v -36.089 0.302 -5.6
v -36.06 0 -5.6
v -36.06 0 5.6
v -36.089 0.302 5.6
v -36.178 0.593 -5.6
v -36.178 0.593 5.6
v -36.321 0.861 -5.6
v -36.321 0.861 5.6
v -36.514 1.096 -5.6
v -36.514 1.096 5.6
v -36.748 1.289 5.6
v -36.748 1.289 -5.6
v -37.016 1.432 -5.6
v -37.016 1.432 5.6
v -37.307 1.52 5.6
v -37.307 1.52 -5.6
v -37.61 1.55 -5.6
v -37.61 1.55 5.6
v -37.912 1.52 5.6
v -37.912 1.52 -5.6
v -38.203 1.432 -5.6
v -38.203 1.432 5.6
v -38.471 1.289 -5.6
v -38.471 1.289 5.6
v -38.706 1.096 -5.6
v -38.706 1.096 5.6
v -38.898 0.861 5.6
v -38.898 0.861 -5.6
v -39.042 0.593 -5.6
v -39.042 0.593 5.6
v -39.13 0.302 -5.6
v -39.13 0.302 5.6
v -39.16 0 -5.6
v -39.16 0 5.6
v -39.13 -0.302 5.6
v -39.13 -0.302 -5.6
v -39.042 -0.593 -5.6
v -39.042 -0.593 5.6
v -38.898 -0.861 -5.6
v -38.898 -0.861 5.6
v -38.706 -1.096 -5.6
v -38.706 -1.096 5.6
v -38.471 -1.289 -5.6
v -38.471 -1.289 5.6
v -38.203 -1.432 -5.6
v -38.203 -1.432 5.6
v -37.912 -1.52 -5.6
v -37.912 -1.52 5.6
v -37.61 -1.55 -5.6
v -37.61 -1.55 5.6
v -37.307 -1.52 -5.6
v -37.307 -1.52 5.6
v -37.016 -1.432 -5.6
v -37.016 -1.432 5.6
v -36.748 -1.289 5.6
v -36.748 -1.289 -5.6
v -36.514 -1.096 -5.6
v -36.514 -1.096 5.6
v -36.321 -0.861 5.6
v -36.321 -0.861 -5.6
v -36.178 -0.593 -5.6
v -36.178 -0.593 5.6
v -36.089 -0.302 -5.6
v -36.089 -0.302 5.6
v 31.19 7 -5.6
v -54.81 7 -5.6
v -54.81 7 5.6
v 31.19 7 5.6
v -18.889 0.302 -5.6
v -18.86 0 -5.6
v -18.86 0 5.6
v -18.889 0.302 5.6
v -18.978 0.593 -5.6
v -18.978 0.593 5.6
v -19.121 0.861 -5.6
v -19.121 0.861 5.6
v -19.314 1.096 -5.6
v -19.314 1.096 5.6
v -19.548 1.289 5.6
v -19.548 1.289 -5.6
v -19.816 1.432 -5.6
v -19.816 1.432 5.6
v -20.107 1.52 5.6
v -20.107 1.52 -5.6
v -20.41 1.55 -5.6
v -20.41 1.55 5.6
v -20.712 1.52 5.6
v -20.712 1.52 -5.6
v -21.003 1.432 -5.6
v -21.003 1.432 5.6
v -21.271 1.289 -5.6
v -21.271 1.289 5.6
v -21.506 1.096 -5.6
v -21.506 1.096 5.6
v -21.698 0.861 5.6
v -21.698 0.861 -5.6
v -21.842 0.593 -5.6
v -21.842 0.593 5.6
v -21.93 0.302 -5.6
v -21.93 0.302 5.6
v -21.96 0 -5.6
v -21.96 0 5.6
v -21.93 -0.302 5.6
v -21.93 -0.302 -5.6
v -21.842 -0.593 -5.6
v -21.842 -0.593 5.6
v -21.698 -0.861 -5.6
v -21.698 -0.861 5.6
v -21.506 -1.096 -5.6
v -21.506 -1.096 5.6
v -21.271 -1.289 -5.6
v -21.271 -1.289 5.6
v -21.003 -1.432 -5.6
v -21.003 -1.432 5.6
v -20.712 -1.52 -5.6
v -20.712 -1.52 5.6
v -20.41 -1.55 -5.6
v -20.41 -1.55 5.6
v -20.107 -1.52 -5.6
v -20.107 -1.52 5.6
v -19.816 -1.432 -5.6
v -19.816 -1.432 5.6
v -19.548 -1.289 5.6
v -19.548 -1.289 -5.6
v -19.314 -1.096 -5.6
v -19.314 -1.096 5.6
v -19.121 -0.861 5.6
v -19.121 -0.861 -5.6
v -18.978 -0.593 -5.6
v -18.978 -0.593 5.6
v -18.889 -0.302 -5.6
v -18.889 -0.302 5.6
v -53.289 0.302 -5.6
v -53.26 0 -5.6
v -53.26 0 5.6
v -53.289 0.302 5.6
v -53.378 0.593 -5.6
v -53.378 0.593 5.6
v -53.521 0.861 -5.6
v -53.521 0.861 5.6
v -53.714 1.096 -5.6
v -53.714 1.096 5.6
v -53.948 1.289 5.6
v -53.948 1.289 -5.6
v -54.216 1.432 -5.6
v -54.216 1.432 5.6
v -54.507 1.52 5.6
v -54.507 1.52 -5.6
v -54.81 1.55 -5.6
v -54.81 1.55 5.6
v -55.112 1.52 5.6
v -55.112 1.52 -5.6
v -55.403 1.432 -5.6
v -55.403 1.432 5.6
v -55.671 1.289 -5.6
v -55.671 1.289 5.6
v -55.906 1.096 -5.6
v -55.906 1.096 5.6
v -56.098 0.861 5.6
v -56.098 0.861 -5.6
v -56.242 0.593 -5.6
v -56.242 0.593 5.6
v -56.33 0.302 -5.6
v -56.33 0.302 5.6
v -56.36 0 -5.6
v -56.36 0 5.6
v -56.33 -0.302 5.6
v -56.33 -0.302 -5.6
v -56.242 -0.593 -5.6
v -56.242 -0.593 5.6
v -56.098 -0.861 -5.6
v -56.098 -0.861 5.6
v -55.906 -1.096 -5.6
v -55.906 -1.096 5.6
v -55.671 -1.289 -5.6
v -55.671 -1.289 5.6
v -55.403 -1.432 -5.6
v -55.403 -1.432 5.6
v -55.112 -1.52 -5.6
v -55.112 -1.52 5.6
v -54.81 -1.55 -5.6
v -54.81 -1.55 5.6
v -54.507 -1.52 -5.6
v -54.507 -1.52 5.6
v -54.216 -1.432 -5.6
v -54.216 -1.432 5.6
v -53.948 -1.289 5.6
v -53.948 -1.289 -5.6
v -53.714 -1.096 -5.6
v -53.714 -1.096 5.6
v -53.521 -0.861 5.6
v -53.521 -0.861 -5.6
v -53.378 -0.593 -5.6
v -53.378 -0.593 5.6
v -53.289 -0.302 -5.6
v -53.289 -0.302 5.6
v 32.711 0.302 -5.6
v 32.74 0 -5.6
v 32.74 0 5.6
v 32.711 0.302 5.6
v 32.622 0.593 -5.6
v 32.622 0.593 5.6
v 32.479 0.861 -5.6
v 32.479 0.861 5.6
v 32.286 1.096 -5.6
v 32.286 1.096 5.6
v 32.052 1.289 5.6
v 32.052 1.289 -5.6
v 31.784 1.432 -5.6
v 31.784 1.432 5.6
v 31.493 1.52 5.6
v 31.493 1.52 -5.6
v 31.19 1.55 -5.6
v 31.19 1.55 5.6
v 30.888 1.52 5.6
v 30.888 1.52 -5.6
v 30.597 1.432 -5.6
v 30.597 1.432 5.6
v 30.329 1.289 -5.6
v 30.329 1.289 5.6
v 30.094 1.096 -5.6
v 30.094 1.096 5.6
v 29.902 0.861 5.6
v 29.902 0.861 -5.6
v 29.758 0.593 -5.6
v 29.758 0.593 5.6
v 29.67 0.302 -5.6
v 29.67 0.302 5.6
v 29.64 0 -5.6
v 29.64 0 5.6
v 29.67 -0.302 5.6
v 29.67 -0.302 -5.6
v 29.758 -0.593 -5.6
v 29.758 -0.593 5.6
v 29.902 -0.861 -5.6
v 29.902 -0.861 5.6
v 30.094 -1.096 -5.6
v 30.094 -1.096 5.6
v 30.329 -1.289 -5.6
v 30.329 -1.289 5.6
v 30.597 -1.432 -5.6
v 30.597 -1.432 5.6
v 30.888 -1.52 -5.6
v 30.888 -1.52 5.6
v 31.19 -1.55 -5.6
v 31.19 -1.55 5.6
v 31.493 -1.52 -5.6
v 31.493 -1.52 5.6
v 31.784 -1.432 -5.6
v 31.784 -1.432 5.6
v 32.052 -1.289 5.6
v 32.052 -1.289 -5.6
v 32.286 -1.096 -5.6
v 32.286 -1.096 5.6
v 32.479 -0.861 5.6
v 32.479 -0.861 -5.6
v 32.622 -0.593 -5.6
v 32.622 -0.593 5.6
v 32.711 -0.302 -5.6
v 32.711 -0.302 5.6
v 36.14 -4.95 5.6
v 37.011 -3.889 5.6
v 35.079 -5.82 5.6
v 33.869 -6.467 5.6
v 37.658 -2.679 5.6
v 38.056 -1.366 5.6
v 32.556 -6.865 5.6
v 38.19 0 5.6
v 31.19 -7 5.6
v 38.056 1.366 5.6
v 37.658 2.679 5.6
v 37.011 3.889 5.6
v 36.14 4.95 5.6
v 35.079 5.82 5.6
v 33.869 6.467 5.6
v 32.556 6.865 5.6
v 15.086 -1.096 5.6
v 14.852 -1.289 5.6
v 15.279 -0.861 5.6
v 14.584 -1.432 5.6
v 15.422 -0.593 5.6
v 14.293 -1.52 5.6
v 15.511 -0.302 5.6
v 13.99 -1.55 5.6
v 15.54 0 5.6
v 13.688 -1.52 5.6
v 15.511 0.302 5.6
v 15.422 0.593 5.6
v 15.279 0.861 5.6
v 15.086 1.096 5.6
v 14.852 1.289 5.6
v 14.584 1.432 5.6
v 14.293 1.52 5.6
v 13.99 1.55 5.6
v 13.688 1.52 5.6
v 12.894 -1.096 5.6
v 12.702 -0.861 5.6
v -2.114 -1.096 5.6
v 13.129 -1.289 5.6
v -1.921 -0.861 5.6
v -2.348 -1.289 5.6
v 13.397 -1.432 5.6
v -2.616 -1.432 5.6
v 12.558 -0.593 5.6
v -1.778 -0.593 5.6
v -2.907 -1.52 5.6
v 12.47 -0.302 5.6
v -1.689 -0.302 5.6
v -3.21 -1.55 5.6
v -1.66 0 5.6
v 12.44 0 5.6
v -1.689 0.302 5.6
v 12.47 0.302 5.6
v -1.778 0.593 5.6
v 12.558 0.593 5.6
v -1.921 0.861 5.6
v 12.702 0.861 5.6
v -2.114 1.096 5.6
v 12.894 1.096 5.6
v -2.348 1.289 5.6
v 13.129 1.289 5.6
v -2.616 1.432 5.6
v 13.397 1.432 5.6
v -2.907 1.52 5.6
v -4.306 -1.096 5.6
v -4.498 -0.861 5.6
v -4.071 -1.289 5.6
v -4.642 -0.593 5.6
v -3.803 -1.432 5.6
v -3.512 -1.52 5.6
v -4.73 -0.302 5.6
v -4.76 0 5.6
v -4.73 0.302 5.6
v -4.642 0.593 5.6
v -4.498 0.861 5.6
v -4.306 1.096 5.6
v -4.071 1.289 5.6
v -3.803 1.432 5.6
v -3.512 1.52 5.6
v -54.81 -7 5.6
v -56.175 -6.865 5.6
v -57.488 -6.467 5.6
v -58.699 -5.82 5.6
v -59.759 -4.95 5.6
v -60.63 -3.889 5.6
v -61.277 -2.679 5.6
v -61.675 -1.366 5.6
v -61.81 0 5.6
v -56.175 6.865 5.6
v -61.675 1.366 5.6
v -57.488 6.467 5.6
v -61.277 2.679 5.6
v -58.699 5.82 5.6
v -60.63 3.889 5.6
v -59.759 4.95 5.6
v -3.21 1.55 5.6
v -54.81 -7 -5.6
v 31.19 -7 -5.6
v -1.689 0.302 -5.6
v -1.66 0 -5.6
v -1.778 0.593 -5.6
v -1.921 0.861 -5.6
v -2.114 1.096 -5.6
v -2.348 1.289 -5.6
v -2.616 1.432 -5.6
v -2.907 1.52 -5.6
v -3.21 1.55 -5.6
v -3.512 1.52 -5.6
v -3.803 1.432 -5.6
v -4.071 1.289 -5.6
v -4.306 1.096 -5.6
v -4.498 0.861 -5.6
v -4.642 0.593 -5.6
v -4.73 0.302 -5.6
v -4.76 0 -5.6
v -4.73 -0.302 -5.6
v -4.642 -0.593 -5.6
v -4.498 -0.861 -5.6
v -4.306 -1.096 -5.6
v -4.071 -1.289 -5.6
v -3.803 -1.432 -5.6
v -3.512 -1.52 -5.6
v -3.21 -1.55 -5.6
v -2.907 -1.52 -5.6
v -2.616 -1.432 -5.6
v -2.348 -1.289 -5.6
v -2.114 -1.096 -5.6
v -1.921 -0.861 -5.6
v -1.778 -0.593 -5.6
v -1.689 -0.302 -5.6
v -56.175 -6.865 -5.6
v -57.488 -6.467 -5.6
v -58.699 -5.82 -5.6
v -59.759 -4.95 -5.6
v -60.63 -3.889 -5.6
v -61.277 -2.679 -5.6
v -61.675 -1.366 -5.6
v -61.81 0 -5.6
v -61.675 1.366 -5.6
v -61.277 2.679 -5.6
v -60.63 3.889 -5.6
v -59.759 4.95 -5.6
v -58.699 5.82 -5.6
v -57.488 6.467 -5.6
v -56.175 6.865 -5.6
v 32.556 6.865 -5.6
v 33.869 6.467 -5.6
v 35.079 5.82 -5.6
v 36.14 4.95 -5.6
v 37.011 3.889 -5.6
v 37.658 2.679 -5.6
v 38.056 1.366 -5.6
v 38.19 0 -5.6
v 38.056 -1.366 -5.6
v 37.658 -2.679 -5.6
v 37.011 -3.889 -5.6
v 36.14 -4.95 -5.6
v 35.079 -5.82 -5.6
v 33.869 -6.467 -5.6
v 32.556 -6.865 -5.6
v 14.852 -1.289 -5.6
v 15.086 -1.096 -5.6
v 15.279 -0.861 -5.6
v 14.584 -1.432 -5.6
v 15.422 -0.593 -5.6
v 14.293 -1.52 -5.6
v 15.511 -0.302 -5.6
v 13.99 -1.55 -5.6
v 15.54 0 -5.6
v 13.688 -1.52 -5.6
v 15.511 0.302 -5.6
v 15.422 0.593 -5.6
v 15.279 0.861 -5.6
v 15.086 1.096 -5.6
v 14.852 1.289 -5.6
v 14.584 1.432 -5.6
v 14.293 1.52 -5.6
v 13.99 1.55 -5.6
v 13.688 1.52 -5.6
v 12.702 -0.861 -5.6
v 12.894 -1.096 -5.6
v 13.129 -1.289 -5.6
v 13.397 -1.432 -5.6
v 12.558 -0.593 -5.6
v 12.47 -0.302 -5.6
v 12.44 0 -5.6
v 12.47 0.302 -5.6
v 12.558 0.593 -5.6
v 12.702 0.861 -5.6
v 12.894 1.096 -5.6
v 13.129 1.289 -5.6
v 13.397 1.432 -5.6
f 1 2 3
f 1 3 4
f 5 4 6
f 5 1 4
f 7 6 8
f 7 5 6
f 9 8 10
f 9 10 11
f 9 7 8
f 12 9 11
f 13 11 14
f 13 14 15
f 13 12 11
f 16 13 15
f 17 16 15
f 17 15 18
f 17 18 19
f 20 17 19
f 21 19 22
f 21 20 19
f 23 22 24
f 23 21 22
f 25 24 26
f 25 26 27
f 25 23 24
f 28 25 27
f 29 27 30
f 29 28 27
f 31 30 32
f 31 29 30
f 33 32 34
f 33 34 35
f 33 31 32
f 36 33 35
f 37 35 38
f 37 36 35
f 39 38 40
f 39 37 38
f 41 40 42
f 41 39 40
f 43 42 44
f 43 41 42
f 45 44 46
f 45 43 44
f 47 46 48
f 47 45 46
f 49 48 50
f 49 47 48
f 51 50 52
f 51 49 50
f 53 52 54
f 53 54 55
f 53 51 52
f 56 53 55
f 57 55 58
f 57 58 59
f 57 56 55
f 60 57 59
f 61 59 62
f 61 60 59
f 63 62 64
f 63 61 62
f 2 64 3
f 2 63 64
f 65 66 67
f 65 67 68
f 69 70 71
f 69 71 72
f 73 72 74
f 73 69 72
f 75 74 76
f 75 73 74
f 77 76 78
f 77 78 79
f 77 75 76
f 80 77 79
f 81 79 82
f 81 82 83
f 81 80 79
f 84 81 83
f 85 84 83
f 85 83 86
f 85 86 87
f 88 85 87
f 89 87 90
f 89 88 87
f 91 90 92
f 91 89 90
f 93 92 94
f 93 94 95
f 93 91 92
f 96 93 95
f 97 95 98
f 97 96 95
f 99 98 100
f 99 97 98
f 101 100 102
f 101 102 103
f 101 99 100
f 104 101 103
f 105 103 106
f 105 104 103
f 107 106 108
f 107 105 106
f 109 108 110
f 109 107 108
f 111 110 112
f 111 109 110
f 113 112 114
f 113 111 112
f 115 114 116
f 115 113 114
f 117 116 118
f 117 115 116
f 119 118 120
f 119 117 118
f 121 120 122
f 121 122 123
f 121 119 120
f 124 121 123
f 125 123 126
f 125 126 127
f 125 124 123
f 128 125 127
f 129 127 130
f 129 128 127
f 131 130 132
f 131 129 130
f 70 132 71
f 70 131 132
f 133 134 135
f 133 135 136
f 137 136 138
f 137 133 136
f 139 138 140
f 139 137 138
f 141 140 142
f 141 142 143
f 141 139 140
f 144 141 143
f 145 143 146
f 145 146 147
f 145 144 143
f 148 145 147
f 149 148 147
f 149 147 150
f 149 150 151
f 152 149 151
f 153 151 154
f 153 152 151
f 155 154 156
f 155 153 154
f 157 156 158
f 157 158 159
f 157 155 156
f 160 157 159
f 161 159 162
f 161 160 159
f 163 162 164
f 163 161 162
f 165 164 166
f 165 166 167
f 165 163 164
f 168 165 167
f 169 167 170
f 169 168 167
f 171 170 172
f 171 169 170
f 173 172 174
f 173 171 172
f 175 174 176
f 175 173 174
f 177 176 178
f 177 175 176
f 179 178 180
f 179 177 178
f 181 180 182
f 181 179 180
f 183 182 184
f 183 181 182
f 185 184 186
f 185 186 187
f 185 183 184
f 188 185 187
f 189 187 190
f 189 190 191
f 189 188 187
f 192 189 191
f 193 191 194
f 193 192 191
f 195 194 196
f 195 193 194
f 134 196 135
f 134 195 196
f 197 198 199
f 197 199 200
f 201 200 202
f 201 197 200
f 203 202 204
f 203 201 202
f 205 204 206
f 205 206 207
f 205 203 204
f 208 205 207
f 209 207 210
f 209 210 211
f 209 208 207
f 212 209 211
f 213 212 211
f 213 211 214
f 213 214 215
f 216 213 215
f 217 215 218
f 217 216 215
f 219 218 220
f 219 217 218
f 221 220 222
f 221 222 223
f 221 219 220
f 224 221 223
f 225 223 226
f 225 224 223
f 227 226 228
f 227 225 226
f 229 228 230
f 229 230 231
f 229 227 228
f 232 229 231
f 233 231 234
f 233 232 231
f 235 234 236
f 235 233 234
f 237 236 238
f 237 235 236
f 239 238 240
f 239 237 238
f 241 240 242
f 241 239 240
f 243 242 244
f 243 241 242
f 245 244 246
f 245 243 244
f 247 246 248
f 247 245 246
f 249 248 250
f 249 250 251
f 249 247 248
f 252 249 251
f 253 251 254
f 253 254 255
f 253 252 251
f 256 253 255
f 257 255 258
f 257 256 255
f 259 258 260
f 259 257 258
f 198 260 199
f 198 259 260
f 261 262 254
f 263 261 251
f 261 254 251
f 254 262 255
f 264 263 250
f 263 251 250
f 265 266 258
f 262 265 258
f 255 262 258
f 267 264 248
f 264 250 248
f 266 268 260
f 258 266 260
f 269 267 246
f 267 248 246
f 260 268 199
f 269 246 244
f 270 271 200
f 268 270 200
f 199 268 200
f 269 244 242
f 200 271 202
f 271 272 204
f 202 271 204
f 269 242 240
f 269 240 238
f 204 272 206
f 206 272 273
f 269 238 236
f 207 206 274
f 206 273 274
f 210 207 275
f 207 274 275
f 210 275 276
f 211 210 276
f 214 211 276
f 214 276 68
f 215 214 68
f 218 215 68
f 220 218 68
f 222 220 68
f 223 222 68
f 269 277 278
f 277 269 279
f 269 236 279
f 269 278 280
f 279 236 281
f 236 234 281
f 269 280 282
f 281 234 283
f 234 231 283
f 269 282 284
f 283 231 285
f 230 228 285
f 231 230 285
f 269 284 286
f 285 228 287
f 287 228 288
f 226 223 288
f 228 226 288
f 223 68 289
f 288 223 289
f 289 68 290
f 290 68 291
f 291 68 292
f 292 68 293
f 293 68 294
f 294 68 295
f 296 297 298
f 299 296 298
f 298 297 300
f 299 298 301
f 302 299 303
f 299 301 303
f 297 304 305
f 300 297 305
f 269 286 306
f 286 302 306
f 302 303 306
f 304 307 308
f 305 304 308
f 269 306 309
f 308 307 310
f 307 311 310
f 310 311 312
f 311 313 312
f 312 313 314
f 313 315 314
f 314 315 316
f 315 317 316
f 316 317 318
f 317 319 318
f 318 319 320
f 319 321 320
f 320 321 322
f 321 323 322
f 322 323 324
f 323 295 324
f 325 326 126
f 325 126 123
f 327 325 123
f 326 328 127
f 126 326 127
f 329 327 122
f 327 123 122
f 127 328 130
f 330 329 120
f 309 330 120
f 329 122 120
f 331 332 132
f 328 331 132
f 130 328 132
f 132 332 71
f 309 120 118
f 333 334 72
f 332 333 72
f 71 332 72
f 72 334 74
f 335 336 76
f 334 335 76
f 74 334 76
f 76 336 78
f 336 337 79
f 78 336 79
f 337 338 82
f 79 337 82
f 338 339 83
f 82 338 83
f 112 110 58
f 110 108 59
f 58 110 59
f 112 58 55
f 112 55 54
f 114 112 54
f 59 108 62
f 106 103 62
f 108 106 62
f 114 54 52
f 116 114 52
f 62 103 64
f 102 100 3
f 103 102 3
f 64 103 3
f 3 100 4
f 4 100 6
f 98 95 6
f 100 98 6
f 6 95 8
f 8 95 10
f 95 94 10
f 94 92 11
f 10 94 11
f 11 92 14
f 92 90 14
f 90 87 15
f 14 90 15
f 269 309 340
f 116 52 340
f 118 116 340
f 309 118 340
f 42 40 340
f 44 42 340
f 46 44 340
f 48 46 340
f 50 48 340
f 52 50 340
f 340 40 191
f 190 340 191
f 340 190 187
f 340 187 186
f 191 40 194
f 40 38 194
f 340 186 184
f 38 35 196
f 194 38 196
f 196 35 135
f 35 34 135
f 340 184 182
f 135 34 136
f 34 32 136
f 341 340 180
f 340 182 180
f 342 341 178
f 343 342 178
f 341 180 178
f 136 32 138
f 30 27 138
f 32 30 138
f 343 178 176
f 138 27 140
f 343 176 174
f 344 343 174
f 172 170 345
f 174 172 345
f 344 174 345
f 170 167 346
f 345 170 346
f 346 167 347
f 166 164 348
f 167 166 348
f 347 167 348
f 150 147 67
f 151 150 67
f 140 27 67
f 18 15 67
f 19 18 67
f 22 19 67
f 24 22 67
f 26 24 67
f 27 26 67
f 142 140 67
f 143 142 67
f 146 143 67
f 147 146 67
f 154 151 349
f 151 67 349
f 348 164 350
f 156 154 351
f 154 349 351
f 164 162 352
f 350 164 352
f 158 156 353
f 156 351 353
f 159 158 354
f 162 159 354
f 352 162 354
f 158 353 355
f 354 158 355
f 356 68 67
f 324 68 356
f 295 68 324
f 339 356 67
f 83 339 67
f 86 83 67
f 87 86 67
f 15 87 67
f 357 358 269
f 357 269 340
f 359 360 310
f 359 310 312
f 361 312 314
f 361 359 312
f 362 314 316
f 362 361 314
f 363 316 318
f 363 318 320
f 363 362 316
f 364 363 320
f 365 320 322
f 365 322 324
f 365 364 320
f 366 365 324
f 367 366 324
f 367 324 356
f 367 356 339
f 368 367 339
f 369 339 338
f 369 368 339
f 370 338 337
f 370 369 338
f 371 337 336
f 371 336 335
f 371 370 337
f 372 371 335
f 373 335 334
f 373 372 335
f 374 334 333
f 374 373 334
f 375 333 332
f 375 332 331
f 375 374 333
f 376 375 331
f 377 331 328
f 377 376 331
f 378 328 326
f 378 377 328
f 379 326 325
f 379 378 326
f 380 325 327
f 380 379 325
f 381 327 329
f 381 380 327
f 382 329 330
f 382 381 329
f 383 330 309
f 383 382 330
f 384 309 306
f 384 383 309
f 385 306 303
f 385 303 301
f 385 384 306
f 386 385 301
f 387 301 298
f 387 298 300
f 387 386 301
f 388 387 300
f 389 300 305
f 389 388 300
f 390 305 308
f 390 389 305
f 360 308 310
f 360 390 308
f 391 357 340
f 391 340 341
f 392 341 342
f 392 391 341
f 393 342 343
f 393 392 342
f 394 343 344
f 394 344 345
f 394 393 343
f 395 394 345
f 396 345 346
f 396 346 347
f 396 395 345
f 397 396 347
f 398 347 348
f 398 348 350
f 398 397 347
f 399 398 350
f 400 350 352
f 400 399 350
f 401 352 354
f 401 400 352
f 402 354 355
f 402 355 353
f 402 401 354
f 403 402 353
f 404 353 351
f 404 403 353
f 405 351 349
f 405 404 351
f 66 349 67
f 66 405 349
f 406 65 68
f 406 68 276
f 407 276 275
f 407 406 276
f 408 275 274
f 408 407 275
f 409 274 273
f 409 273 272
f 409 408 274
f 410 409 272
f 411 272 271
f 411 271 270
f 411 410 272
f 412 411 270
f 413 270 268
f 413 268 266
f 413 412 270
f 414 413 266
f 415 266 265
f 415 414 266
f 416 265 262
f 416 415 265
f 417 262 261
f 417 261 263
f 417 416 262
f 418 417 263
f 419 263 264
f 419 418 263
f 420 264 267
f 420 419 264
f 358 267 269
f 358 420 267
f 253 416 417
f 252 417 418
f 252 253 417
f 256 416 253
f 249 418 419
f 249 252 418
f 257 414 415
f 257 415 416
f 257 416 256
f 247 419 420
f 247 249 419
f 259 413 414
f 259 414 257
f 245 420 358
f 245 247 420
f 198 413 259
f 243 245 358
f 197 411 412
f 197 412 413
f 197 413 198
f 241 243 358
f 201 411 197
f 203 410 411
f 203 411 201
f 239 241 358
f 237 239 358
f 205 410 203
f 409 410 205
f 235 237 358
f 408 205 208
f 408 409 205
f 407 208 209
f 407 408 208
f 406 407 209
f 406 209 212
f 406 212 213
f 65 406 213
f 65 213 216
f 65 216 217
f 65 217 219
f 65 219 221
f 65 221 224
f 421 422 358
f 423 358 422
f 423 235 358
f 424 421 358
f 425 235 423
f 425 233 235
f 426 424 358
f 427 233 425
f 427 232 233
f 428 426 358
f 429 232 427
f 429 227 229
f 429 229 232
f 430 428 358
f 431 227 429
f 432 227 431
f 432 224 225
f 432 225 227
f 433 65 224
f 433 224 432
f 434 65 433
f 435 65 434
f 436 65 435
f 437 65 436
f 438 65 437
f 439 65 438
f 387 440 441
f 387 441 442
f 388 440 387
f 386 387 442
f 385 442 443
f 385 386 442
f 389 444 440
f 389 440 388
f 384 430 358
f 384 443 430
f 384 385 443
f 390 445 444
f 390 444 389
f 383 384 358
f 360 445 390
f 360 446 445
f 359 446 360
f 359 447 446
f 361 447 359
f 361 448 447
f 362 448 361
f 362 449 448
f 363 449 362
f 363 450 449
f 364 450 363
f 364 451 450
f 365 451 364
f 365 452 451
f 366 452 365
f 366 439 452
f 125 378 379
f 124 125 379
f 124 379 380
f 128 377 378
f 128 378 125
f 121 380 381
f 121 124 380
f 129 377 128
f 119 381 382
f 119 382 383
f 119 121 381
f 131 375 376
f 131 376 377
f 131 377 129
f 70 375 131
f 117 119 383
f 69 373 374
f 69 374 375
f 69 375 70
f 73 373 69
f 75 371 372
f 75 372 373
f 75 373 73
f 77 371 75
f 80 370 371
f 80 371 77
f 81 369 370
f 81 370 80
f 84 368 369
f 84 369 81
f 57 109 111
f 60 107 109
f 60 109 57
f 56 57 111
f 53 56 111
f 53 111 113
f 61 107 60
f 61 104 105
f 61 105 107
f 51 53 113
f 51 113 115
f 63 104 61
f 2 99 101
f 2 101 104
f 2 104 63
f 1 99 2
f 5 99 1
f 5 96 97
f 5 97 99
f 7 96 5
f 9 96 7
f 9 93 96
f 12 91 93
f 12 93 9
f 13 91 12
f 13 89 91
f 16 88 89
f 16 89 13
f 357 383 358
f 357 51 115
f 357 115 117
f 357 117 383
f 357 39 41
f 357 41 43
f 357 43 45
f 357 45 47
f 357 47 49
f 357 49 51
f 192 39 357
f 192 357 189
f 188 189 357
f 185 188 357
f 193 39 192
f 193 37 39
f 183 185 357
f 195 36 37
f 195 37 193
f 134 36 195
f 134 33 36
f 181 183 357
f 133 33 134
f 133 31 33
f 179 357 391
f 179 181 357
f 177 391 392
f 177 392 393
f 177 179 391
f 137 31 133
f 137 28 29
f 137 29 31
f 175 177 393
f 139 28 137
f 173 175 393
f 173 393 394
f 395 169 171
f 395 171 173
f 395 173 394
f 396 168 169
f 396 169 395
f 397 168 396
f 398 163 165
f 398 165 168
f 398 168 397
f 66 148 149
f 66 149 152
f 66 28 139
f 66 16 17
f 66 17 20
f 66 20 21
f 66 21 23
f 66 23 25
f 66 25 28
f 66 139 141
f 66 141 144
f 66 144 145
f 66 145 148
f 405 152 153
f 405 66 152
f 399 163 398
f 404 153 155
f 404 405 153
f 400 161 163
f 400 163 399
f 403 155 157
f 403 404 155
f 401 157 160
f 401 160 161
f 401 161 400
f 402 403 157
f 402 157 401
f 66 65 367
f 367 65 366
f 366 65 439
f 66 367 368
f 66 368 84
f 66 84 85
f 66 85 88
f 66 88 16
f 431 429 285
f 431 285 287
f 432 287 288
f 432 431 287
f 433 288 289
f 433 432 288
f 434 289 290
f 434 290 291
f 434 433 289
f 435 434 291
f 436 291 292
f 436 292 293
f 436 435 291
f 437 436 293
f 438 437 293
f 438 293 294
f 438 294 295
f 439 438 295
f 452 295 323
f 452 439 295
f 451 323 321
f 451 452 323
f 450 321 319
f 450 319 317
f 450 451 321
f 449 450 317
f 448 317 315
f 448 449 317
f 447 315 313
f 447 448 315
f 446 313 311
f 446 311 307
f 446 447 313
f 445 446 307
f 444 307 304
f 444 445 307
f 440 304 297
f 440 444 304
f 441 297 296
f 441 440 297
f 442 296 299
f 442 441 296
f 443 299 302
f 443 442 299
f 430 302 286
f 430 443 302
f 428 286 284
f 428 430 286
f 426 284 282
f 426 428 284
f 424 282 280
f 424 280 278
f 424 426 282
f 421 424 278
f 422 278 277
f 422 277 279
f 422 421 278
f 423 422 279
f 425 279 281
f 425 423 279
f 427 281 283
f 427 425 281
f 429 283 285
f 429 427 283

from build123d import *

# Parameters (mm, degrees)
BOSS_EXTRUDE1_DEPTH      = 2.8
BOSS_EXTRUDE1_DEPTH_BACK = 2.8
ECHELLE1_SCALE           = 2
SKETCH2_R                = 1.55
CUT_EXTRUDE6_DEPTH       = 11.2


with BuildPart() as part:
    # Sketch1 → Boss-Extrude1 (new, two sides: drawn at the far end of the back side and taken through both)
    with BuildSketch(Plane.XY.offset(-BOSS_EXTRUDE1_DEPTH_BACK)):
        with BuildLine():
            Line((-33.309608541, 3.5), (9.690391459, 3.5))
            ThreePointArc((9.690391459, 3.5), (13.190391459, 0), (9.690391459, -3.5))
            Line((9.690391459, -3.5), (-33.309608541, -3.5))
            ThreePointArc((-33.309608541, -3.5), (-36.809608541, 0), (-33.309608541, 3.5))
        make_face()
    extrude(amount=BOSS_EXTRUDE1_DEPTH + BOSS_EXTRUDE1_DEPTH_BACK)


with BuildPart() as part_1:
    # Echelle1: scaled about (-11.809608541, 0, 0)
    add(part.part.scale(ECHELLE1_SCALE).moved(Location((11.809608541, 0, 0))))

    # Sketch2 → Cut-Extrude6 (cut)
    with BuildSketch(Plane.XY.offset(-5.6)):
        with Locations((-54.809608541, 0)):
            Circle(SKETCH2_R)
        with Locations((-37.609608541, 0)):
            Circle(SKETCH2_R)
        with Locations((-20.409608541, 0)):
            Circle(SKETCH2_R)
        with Locations((-3.209608541, 0)):
            Circle(SKETCH2_R)
        with Locations((13.990391459, 0)):
            Circle(SKETCH2_R)
        with Locations((31.190391459, 0)):
            Circle(SKETCH2_R)
    extrude(amount=CUT_EXTRUDE6_DEPTH, mode=Mode.SUBTRACT)


solid = part_1.part
